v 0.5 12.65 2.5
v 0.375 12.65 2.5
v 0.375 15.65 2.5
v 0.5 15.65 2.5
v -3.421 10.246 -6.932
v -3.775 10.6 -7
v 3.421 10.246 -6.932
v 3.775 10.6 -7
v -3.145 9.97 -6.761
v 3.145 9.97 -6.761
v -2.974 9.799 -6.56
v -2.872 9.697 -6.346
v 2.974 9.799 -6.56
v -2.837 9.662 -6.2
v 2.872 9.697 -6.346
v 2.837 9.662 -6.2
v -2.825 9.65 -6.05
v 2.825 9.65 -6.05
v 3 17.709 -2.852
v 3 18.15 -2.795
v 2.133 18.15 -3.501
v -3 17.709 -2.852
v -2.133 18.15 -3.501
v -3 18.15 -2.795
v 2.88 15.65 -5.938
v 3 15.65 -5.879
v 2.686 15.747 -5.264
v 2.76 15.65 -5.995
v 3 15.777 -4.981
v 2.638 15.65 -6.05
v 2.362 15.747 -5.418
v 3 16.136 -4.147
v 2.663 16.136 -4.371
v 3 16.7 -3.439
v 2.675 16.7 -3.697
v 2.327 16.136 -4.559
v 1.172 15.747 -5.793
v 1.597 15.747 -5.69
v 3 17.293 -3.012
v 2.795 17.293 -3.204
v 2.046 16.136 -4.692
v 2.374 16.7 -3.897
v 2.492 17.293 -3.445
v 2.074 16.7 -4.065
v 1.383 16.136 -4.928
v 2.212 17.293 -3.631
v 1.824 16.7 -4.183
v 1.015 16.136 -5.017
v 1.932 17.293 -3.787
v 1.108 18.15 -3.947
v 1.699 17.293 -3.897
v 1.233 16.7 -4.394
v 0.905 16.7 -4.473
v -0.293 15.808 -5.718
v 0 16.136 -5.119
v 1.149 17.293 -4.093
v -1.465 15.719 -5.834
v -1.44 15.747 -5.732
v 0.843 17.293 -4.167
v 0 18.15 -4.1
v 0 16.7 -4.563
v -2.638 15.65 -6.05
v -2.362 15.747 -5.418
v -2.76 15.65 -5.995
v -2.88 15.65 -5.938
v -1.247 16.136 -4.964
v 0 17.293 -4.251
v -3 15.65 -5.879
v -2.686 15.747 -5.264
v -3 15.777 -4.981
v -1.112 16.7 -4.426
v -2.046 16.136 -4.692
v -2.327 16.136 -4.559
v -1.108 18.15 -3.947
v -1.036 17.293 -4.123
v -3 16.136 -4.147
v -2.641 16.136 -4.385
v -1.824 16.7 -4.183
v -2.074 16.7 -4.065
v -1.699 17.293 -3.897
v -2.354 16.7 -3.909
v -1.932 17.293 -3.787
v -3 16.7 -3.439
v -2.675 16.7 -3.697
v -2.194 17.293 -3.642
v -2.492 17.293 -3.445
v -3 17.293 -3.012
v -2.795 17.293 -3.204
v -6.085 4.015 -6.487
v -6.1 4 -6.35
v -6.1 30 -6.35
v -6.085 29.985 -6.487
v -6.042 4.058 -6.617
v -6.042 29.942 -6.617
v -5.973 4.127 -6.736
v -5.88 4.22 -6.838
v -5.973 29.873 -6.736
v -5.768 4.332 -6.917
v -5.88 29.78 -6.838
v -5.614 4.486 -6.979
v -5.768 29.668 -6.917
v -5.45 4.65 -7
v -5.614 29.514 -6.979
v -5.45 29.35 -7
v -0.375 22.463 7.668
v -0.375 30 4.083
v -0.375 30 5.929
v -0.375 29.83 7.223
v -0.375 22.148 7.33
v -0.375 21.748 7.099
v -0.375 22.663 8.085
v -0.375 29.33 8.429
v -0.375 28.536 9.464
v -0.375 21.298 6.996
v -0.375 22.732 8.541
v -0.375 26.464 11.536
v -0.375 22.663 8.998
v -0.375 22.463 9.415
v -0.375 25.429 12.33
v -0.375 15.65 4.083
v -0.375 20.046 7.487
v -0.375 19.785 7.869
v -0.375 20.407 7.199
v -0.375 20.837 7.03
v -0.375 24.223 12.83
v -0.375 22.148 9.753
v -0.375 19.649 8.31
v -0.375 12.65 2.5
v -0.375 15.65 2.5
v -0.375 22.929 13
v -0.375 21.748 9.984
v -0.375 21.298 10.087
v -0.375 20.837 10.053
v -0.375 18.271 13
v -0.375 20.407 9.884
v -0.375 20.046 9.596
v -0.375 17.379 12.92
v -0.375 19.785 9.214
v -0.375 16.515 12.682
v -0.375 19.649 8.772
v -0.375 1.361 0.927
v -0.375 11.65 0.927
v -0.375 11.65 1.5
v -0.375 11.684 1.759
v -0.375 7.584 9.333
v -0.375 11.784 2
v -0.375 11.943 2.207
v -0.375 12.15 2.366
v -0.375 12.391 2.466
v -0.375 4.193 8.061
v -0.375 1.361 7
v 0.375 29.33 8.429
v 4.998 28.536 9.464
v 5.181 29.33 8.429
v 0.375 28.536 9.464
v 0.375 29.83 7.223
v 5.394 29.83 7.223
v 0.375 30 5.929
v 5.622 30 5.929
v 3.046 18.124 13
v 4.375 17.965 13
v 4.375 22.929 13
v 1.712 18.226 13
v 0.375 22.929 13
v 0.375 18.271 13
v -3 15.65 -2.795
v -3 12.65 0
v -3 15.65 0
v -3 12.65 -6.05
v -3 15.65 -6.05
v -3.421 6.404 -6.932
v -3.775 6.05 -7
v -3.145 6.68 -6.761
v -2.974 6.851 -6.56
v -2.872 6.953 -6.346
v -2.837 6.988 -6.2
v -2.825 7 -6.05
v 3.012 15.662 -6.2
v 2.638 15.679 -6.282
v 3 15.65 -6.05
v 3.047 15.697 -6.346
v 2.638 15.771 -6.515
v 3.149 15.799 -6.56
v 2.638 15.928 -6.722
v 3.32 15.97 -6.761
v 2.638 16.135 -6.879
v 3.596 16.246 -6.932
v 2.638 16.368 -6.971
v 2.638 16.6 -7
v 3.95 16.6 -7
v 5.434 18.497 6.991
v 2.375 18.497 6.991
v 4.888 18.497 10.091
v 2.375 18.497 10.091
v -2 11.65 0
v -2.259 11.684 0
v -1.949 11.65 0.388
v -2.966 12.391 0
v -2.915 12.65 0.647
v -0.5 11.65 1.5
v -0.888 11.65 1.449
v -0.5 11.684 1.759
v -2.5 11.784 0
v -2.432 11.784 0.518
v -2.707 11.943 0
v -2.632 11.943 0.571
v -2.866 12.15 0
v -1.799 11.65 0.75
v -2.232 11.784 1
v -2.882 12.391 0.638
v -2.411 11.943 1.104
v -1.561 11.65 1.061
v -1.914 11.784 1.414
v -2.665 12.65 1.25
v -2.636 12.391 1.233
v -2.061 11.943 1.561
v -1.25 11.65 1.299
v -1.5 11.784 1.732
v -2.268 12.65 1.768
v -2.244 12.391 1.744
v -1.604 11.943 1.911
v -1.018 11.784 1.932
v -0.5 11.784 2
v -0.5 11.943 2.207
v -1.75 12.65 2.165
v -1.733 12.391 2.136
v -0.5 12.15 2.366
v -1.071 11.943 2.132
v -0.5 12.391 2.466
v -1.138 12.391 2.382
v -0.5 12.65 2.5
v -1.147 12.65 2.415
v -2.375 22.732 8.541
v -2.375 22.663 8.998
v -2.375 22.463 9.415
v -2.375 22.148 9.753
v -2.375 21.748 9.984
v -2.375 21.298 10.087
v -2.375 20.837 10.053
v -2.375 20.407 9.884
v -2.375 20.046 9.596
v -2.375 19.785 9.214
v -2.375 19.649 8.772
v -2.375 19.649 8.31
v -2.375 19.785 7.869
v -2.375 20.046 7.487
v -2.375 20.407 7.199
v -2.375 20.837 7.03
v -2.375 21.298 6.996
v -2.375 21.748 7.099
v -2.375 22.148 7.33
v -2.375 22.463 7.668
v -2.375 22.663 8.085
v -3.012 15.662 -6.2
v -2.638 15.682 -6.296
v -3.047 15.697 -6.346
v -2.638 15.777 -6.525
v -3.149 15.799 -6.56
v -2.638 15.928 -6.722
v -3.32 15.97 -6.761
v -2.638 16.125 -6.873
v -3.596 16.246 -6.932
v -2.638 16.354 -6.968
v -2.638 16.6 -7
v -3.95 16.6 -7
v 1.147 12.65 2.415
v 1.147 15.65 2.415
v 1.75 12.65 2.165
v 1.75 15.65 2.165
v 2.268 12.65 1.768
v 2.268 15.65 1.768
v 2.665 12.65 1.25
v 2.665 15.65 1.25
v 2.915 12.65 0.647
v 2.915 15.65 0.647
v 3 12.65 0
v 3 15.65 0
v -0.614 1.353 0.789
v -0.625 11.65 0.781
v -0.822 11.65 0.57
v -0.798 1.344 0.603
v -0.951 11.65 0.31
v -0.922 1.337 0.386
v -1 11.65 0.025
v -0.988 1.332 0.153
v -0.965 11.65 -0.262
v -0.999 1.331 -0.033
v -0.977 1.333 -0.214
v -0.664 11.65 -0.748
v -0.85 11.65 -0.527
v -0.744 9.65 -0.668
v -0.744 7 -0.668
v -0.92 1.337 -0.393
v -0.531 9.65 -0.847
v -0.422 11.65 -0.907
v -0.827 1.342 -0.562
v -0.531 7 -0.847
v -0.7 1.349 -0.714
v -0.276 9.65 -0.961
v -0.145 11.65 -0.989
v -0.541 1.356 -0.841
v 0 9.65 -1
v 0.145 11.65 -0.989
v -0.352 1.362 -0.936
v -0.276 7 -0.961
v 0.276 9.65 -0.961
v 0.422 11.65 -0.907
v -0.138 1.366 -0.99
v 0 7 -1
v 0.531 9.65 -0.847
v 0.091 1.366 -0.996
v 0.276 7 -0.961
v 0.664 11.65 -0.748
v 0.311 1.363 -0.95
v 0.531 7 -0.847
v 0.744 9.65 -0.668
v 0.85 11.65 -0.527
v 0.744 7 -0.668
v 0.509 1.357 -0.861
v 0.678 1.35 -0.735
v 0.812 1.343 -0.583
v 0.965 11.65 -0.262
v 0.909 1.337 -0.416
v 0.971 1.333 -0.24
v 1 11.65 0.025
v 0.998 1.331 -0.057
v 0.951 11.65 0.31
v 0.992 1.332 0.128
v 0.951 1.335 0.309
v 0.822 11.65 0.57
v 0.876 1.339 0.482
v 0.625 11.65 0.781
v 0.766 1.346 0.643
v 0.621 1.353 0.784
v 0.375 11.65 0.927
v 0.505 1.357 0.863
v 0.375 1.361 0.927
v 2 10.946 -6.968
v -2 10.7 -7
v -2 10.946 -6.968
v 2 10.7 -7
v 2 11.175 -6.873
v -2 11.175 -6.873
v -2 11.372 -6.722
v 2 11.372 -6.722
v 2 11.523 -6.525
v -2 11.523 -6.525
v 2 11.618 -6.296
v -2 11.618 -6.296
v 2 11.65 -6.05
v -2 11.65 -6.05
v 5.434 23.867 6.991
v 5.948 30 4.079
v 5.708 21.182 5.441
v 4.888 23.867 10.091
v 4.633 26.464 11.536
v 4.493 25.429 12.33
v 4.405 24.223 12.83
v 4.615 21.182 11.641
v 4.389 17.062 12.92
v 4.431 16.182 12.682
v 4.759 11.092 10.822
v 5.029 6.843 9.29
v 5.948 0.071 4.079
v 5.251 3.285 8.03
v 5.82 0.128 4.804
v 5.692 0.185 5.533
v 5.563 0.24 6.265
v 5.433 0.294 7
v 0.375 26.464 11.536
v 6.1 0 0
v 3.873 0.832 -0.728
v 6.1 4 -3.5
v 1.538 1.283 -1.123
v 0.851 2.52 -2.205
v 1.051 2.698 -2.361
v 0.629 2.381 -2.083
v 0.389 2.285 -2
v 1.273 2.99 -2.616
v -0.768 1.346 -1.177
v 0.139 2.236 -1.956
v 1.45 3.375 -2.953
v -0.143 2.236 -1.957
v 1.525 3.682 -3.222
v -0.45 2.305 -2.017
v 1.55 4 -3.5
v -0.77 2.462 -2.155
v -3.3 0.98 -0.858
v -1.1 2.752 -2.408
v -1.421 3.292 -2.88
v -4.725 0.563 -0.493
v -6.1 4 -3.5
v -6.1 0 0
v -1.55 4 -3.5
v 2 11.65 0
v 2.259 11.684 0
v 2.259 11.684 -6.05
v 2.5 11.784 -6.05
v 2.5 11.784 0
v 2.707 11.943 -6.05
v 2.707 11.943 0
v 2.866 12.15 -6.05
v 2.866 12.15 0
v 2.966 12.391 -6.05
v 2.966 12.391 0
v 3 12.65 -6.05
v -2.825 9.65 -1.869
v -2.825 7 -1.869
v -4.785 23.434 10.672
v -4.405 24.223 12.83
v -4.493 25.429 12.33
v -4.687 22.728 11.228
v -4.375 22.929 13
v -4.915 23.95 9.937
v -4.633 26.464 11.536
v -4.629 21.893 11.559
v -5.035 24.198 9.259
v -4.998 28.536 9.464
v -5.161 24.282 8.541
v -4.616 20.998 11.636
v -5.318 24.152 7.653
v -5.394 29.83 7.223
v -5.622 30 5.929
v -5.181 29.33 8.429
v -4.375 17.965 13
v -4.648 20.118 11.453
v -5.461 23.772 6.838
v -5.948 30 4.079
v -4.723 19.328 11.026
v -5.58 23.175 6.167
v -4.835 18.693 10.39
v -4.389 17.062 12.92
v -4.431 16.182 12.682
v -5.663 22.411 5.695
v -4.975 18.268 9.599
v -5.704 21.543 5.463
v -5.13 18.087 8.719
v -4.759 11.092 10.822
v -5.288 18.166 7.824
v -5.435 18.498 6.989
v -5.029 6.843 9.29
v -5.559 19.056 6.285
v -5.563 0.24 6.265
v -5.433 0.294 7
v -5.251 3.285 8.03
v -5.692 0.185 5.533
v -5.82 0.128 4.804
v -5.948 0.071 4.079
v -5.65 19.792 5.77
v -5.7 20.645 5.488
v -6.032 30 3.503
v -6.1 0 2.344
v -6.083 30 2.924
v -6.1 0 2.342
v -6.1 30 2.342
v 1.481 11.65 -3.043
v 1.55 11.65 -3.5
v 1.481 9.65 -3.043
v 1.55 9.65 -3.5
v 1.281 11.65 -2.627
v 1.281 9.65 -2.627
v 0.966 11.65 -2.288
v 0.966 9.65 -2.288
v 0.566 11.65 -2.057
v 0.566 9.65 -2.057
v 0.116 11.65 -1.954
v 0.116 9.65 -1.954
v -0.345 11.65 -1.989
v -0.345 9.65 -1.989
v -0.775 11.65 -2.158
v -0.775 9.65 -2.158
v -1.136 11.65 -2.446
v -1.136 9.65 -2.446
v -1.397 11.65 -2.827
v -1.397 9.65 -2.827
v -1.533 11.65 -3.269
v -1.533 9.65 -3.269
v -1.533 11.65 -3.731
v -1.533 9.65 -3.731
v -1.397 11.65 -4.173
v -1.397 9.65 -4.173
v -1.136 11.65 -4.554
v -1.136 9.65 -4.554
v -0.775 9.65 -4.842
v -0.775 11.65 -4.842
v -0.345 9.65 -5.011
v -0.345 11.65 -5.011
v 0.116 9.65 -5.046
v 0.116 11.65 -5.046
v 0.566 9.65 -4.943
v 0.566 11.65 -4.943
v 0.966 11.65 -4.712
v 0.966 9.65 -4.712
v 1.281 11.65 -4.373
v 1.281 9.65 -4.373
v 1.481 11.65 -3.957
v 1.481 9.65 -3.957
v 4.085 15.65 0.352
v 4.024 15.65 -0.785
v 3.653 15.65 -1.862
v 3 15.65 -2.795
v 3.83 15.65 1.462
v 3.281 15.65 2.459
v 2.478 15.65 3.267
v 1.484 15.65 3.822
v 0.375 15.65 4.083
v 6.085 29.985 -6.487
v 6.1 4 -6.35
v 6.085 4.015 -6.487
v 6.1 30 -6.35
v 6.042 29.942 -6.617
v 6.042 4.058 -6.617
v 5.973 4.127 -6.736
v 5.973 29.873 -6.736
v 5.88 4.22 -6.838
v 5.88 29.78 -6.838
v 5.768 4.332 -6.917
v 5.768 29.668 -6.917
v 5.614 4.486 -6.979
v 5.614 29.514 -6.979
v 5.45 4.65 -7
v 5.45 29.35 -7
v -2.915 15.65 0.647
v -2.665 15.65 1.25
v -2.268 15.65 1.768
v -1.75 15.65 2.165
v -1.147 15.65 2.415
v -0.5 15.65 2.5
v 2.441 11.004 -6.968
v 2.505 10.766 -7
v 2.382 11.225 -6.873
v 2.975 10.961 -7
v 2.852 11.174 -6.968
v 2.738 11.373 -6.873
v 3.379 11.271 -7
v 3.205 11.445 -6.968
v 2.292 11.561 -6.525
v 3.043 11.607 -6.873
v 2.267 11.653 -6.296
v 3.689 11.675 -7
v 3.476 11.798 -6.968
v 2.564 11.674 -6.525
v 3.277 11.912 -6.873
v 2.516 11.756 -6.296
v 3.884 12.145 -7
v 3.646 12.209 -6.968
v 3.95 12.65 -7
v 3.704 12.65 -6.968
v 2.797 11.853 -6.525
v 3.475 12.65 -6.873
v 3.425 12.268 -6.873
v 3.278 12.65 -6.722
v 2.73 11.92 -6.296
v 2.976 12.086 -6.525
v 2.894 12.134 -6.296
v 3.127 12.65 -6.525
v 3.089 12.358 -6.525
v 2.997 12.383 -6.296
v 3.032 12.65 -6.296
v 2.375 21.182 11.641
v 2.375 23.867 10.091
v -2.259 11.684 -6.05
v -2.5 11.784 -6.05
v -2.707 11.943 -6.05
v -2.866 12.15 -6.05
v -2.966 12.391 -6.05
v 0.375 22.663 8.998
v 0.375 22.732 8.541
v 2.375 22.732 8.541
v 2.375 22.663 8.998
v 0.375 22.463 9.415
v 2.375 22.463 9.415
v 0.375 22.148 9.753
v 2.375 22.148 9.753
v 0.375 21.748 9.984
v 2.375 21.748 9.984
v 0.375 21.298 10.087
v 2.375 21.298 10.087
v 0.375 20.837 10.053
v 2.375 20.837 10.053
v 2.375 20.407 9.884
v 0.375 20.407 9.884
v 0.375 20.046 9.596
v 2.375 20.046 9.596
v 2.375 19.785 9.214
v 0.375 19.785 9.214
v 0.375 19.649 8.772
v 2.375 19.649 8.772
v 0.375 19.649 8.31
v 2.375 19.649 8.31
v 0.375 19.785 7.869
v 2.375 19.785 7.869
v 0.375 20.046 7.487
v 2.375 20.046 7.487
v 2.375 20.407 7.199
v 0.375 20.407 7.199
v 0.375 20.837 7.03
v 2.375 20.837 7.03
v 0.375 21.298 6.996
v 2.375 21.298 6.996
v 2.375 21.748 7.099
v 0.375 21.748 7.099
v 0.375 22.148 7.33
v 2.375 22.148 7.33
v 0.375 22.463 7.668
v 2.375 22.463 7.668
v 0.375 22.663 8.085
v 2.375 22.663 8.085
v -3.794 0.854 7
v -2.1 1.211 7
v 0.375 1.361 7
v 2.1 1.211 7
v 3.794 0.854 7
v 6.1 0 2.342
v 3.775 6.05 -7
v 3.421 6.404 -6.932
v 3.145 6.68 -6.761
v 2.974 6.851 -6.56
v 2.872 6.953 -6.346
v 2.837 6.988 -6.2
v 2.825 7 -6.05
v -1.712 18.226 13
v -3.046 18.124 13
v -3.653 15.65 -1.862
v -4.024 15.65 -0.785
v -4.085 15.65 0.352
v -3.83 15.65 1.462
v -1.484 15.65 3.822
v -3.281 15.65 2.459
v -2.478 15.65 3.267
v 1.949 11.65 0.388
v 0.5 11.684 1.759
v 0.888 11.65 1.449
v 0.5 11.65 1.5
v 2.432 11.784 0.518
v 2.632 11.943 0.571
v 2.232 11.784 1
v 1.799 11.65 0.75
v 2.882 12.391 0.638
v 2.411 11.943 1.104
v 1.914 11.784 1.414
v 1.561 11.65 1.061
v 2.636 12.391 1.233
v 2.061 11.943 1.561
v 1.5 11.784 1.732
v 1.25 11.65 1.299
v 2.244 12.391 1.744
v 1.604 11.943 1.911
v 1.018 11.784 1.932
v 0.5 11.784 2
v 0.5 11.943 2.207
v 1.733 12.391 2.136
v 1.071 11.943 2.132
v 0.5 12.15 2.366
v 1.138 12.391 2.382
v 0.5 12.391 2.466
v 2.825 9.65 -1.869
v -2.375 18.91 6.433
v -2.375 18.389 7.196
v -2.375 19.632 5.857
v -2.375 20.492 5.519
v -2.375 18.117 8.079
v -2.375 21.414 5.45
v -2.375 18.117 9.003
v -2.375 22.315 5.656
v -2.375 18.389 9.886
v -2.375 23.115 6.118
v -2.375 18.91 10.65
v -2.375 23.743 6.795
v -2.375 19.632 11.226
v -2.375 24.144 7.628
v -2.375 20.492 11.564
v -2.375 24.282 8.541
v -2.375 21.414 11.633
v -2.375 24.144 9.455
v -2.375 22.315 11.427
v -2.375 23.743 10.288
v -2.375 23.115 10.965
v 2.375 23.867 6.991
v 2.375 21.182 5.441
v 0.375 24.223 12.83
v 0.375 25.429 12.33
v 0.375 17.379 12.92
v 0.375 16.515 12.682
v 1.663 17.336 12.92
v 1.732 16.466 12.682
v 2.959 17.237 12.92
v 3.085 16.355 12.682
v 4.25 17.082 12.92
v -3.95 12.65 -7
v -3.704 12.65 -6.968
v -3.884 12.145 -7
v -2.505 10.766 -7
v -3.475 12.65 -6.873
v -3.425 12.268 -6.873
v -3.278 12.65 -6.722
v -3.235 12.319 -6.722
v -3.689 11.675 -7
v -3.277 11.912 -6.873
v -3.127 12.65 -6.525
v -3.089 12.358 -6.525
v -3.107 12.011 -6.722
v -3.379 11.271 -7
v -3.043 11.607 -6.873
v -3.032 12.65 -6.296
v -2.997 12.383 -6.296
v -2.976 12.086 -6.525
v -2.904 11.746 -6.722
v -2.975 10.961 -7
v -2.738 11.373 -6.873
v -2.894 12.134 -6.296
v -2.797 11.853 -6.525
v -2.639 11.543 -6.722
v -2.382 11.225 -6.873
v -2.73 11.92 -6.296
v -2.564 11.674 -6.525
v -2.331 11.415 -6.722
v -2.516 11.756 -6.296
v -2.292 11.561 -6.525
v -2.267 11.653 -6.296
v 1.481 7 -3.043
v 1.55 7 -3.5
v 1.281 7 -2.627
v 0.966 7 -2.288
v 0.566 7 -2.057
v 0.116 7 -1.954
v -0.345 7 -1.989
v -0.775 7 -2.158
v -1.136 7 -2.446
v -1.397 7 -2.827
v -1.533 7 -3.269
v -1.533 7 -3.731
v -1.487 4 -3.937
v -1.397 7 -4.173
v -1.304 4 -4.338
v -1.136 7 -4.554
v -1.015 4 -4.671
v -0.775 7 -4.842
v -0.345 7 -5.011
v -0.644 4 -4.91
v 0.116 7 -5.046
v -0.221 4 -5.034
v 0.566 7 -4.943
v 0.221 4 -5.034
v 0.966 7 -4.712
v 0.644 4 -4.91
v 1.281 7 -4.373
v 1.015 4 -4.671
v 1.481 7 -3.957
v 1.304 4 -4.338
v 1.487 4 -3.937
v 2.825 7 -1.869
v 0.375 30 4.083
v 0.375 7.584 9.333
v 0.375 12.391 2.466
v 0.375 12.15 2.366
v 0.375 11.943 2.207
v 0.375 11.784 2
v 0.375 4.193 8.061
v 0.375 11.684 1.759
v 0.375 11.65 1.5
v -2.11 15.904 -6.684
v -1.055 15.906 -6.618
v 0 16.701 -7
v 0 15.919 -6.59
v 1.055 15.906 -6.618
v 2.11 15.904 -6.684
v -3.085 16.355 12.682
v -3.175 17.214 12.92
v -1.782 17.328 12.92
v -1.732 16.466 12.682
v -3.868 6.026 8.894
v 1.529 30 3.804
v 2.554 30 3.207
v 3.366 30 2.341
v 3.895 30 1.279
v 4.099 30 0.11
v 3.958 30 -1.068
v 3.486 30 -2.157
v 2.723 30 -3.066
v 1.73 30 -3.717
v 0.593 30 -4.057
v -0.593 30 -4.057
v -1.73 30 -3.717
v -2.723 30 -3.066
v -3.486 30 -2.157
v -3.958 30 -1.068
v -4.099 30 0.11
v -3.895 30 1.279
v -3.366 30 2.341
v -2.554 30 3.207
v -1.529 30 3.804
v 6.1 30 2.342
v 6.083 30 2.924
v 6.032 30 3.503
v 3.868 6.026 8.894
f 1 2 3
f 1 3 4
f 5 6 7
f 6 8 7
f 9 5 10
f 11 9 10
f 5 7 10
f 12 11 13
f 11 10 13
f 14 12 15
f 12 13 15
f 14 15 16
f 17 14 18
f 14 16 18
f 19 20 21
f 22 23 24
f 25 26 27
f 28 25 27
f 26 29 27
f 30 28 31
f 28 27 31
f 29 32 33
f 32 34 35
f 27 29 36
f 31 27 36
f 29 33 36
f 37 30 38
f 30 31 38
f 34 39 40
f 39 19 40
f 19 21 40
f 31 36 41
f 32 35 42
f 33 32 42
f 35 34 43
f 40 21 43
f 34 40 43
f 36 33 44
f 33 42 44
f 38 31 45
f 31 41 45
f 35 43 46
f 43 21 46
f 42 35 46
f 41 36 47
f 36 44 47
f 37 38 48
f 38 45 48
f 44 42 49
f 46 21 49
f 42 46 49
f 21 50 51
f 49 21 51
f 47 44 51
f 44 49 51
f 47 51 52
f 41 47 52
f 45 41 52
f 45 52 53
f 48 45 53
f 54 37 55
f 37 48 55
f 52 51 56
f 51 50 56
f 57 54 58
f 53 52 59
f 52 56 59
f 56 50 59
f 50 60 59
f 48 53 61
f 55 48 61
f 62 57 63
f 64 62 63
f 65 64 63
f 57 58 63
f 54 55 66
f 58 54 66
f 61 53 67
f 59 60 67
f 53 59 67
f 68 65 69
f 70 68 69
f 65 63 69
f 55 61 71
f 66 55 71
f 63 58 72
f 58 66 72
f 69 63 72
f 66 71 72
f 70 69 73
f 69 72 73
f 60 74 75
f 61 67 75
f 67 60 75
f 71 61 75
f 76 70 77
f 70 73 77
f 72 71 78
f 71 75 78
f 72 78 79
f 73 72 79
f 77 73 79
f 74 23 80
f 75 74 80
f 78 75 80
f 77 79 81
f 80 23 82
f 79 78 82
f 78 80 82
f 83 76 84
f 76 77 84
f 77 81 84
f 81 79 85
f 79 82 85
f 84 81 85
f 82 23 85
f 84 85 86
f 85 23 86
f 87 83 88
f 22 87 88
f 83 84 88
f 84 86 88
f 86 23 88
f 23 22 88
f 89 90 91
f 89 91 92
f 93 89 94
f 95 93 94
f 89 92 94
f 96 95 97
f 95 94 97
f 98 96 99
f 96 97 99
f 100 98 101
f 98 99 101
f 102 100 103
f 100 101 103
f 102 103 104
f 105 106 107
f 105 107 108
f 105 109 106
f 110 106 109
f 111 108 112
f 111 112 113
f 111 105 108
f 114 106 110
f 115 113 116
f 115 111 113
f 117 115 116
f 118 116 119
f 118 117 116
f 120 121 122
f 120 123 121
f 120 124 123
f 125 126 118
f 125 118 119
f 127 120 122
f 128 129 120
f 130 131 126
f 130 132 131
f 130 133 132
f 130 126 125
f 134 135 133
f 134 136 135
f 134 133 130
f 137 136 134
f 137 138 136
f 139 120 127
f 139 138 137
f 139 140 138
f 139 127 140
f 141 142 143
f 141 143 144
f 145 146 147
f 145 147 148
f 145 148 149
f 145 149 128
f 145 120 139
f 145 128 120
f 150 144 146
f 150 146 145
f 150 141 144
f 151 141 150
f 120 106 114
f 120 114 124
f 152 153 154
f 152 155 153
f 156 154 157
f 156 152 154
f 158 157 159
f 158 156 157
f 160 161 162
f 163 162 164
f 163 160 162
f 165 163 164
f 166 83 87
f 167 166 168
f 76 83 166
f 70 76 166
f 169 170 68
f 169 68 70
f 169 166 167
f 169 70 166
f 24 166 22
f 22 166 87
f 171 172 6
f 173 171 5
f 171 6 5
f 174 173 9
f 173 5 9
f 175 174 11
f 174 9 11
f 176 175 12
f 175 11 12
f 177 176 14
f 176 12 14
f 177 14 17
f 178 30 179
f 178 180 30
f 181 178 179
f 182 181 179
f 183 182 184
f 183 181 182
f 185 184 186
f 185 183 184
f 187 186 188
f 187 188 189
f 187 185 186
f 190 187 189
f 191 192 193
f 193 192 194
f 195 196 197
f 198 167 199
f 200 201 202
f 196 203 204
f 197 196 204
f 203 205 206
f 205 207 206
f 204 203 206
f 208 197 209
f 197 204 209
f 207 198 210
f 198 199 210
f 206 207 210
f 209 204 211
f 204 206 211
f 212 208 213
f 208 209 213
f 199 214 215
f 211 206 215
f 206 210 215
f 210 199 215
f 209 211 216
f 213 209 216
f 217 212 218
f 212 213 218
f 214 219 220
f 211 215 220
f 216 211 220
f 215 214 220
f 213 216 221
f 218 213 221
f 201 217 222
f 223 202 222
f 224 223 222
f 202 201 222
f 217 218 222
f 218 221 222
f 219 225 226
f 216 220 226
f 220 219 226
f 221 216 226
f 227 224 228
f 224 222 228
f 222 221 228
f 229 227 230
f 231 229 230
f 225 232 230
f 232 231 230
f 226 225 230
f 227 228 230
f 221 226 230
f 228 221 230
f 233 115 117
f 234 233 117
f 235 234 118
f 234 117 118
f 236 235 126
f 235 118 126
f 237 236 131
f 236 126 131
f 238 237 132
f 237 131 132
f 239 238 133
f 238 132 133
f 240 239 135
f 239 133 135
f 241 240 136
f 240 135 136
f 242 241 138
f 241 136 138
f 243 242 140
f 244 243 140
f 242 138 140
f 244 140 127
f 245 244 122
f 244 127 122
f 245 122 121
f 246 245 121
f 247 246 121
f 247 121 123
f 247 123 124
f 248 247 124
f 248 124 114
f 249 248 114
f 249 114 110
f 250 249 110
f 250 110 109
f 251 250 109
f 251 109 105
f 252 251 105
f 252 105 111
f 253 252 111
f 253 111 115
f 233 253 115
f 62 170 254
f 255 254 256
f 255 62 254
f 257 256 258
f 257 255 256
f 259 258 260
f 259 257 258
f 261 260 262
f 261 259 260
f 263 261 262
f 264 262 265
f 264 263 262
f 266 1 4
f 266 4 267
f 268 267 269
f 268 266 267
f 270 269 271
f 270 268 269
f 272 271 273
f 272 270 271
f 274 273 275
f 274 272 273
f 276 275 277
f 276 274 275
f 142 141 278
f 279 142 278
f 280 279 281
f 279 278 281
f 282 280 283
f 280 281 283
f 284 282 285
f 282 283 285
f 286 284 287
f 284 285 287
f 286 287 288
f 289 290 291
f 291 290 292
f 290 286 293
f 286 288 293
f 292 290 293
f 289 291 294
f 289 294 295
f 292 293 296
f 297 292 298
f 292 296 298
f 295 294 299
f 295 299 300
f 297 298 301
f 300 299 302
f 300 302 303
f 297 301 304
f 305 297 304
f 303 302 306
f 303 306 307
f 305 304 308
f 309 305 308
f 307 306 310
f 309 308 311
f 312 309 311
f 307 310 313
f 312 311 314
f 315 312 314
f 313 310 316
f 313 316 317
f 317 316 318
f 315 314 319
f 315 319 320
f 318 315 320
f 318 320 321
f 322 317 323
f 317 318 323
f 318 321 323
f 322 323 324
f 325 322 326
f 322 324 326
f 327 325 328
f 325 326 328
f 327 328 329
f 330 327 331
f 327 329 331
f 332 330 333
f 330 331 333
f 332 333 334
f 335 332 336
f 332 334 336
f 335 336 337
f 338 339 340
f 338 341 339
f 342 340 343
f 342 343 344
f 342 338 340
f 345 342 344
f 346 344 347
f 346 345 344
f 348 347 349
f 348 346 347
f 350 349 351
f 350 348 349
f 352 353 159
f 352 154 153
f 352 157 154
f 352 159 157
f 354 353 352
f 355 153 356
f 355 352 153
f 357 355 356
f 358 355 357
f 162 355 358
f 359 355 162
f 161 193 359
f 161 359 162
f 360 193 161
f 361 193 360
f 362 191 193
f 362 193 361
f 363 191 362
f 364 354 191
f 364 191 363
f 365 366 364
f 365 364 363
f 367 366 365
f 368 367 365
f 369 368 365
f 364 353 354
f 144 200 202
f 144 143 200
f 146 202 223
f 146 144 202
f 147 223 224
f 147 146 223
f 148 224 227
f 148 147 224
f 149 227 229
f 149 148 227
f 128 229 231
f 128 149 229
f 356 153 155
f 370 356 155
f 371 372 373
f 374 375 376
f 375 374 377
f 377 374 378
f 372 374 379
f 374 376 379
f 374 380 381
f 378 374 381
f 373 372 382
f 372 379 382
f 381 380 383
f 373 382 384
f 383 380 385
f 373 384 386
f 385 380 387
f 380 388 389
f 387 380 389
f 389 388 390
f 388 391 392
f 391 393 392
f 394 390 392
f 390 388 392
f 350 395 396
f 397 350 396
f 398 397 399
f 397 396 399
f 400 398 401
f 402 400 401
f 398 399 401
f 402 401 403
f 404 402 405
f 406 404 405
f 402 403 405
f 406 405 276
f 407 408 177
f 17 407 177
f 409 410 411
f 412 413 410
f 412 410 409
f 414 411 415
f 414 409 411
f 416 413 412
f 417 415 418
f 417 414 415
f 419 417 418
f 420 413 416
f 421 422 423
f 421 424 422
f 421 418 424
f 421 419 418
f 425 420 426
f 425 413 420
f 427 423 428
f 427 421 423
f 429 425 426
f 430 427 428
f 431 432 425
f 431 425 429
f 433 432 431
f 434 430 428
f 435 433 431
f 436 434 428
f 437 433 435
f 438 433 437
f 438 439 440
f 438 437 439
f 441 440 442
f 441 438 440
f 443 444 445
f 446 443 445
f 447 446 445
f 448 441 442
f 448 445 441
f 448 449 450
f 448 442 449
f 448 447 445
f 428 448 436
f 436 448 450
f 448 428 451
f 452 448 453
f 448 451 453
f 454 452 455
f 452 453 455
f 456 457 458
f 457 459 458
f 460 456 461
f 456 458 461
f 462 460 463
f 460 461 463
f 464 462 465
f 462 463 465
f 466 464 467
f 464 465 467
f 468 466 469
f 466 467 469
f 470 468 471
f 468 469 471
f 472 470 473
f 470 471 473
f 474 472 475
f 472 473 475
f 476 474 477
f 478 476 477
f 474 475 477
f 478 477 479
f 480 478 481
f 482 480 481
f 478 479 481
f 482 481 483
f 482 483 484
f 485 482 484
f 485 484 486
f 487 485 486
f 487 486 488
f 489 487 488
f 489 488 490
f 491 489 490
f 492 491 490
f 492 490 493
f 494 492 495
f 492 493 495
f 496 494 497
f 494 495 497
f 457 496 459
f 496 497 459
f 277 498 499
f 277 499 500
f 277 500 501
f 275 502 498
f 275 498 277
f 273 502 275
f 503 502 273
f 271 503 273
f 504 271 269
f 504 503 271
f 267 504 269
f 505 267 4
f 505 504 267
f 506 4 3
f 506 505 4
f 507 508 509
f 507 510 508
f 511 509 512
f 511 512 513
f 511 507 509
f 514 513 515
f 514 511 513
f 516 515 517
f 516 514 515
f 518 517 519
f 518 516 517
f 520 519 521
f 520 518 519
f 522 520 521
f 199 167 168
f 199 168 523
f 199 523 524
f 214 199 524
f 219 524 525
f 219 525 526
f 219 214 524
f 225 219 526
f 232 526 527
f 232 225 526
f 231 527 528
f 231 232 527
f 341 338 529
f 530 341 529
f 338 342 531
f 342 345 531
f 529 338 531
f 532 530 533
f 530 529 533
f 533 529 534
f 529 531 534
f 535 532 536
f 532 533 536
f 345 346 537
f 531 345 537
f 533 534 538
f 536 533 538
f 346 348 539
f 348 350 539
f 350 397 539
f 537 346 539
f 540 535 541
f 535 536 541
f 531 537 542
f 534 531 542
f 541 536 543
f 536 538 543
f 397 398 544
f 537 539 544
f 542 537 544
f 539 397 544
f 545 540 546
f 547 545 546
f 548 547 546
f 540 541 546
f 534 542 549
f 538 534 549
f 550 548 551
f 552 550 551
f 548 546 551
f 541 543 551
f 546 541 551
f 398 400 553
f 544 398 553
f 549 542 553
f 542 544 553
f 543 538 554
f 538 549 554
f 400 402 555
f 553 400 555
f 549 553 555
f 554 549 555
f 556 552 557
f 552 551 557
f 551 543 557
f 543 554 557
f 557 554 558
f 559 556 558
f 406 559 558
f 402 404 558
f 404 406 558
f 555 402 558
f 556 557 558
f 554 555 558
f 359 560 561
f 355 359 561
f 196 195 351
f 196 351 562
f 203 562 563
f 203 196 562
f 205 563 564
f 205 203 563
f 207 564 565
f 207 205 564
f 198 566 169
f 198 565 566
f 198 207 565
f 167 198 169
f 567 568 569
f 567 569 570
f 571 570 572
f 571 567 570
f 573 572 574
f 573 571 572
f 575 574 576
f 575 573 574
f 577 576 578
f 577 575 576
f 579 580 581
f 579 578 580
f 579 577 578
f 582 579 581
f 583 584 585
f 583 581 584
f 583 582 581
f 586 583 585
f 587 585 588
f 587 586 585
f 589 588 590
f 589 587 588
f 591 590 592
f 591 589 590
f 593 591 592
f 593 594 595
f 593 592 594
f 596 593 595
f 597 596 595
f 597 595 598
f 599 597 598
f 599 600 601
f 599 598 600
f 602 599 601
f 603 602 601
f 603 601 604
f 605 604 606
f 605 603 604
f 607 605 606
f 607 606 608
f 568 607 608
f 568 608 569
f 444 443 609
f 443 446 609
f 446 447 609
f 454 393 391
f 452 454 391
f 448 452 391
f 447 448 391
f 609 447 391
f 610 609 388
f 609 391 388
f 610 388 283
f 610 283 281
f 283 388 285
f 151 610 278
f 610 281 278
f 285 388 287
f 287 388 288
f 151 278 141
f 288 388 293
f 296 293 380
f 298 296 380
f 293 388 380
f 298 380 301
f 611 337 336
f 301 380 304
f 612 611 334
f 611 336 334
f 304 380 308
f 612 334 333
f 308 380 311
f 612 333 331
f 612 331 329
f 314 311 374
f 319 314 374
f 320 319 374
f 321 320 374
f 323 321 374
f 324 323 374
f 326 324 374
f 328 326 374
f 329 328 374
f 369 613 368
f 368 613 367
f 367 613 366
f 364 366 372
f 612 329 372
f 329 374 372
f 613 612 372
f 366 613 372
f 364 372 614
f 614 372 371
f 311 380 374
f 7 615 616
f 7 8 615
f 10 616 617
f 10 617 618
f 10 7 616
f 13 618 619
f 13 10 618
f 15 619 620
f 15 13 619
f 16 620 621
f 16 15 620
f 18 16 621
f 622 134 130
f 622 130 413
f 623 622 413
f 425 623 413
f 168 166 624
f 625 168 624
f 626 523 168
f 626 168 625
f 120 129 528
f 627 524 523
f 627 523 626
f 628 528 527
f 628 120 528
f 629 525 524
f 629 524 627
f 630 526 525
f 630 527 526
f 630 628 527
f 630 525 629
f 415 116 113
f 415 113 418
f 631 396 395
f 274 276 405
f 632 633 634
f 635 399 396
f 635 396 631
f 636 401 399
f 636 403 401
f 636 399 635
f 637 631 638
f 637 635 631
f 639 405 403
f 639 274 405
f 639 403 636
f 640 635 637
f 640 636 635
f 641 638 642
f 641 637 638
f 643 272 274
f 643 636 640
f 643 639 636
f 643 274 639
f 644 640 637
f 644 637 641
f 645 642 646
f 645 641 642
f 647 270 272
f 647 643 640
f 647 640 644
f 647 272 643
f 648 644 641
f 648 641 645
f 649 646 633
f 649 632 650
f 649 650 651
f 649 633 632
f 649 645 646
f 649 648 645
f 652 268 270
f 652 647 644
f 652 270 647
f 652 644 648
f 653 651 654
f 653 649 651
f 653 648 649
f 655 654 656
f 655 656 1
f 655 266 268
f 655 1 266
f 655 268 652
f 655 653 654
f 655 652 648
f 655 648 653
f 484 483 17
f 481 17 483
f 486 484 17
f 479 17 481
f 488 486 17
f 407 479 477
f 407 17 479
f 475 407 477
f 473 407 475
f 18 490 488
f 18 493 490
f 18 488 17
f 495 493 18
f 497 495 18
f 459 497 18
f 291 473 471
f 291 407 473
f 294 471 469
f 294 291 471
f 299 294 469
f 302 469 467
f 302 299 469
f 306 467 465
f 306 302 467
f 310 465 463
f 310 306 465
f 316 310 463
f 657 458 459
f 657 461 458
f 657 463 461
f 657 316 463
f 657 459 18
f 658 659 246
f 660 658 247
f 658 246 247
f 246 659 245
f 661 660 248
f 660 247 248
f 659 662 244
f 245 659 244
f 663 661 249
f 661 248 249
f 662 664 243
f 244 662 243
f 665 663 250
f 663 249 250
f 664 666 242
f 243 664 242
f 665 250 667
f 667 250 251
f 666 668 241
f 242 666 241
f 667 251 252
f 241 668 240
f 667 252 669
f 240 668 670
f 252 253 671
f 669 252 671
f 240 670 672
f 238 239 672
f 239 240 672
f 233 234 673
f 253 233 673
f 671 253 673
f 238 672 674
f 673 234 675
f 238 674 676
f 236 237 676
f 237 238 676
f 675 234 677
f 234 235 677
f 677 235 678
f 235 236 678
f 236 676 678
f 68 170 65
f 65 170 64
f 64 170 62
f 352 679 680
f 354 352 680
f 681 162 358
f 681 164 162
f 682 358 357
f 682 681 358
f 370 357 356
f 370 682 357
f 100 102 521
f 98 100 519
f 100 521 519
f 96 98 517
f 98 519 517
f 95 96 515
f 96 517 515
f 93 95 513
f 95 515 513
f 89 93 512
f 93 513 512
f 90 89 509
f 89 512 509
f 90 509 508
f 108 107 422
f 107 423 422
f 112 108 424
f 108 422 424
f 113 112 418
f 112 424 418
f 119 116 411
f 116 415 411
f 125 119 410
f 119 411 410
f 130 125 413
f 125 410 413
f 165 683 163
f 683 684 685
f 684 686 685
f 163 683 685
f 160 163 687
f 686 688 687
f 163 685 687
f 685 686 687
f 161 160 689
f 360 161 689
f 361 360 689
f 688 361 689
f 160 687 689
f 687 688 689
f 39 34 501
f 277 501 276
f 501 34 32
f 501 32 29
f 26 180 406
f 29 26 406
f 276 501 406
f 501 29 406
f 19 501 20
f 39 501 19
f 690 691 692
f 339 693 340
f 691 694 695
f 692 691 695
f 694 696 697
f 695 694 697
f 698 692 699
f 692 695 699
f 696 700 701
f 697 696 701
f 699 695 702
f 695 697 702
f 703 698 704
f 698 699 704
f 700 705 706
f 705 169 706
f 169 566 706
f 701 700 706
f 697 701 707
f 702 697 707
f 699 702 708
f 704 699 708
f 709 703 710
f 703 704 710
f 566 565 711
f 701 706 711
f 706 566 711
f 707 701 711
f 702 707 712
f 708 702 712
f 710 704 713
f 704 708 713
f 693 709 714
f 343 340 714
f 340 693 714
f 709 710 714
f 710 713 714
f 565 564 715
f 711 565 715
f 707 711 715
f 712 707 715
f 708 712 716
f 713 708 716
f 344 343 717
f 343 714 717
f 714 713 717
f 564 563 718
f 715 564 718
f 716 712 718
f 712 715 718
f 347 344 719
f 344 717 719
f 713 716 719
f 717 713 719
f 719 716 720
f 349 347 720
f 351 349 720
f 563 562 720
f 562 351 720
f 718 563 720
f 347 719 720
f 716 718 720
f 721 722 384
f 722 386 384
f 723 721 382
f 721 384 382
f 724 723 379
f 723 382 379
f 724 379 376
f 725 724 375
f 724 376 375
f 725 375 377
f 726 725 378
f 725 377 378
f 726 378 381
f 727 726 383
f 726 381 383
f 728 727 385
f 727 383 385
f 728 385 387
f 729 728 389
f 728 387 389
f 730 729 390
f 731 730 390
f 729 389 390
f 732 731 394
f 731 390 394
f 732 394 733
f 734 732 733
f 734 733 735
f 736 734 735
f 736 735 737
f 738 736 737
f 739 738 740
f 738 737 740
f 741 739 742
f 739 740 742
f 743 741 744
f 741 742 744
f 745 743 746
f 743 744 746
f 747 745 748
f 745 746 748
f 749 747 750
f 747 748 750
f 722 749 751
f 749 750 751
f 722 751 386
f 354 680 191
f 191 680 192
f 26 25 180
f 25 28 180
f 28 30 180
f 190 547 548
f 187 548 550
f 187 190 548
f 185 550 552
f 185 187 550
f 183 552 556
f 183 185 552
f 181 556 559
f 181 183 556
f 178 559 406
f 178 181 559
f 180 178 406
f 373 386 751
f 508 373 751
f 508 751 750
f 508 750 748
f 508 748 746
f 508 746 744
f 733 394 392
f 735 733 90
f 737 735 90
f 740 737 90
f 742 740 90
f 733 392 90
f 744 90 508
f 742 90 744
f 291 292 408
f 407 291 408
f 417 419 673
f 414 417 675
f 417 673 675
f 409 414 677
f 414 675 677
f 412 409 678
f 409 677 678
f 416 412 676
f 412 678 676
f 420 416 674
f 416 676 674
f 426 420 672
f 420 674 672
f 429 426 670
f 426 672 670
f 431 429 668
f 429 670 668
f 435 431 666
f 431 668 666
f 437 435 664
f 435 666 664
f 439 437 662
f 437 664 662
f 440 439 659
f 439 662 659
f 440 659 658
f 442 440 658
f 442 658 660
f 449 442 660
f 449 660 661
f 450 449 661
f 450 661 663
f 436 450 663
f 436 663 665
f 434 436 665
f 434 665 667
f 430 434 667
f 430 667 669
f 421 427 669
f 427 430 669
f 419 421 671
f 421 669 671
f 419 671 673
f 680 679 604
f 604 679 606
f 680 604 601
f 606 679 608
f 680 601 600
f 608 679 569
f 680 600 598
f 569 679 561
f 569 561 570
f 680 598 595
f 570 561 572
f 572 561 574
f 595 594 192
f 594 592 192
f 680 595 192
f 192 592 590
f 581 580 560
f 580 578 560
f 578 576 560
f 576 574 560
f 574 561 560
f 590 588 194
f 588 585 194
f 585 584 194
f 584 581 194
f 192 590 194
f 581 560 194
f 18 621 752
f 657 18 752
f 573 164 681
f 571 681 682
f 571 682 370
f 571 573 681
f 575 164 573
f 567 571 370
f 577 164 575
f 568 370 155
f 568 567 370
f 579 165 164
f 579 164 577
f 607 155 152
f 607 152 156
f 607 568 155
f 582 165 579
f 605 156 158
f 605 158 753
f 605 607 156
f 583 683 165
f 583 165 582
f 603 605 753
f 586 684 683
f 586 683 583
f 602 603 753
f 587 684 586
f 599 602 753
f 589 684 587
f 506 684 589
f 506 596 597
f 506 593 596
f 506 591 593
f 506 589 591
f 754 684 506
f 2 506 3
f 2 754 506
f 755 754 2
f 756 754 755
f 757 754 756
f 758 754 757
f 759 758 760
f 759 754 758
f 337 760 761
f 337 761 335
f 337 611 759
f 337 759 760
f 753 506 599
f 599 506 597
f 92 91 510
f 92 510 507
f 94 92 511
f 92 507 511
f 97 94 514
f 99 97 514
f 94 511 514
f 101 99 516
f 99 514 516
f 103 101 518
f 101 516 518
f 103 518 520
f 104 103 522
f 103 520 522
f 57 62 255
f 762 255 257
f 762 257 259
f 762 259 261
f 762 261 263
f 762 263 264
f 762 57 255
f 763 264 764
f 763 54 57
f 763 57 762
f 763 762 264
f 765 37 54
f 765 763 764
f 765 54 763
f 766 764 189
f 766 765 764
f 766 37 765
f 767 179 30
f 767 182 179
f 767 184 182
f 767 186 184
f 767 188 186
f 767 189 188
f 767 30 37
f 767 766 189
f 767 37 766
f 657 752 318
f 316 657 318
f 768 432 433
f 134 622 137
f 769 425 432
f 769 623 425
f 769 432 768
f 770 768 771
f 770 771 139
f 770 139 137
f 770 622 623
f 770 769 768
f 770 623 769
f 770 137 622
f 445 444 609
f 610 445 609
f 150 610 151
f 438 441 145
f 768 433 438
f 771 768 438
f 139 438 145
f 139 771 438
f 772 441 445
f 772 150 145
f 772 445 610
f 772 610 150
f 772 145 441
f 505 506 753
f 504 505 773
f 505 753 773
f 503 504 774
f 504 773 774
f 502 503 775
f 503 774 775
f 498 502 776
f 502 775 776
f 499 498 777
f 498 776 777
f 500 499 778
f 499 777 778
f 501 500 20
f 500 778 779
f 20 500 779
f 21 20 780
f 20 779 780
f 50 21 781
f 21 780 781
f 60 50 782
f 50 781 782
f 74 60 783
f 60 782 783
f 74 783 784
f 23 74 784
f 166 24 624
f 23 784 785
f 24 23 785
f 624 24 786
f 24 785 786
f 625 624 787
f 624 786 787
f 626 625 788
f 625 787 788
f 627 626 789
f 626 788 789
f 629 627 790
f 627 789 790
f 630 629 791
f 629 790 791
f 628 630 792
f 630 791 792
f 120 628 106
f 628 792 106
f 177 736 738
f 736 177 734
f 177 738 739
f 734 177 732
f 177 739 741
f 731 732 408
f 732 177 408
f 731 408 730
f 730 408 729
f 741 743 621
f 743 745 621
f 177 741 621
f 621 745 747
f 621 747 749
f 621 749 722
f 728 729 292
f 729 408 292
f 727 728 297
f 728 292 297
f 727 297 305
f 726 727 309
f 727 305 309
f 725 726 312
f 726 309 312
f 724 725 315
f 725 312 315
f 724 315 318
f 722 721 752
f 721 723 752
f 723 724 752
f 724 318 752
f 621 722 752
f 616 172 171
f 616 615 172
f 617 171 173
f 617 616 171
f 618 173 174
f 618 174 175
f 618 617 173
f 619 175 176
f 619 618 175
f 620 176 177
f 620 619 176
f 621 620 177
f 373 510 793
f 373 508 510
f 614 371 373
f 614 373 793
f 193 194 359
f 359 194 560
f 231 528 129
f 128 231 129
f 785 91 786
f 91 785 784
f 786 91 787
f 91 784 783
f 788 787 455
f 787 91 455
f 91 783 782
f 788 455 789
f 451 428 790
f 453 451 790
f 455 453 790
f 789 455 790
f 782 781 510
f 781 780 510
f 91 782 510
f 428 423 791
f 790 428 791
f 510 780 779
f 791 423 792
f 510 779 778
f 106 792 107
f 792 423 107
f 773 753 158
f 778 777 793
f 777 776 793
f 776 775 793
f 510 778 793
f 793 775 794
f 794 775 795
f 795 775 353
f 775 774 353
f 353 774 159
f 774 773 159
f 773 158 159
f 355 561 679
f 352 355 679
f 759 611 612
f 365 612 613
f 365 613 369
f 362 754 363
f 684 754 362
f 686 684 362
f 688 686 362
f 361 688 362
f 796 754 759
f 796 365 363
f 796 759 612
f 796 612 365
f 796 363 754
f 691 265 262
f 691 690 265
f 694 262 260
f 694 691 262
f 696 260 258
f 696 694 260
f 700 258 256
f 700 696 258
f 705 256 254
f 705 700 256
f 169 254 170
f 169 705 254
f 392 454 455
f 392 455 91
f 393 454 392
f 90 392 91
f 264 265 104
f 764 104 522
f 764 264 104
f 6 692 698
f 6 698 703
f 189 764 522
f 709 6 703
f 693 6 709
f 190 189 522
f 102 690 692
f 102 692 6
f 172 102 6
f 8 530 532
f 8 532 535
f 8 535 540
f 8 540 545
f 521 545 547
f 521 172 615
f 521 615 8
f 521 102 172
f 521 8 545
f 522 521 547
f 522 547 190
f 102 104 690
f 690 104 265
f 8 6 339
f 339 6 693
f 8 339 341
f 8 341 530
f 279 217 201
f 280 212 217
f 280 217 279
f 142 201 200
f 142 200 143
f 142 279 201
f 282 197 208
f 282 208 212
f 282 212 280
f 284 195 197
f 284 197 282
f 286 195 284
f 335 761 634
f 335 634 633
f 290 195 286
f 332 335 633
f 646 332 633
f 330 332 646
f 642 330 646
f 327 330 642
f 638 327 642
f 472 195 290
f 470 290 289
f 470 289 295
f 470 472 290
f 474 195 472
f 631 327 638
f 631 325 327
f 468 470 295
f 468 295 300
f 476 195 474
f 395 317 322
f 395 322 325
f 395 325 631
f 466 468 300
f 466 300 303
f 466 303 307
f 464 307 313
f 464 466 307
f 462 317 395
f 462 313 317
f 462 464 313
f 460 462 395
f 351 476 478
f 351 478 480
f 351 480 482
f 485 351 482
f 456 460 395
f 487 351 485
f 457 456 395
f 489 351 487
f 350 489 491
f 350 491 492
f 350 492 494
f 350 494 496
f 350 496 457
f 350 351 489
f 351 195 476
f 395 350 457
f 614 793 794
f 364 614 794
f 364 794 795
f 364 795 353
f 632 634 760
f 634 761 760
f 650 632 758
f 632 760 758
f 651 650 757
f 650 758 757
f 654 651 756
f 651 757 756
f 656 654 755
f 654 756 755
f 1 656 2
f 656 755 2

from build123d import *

# Parameters (mm, degrees)
EXTRUDE004_DEPTH                     = 10
SKETCH008_R                          = 3.1
EXTRUDE003_DEPTH                     = 10
EXTRUDE002_DEPTH                     = 2.65
EXTRUDE002_ONTO_SKETCH004_ROLL_ANGLE = 90
EXTRUDE001_DEPTH                     = 14
EXTRUDE_DEPTH                        = 30
EXTRUDE_ONTO_SKETCH_ROLL_ANGLE       = 90
FILLET_R                             = 10
POCKET_DEPTH                         = 20.001
SKETCH003_R                          = 1.55
POCKET001_DEPTH                      = 8
SKETCH005_W                          = 6
SKETCH005_H                          = 4
POCKET002_DEPTH                      = 9.5
SKETCH006_R                          = 4.1
POCKET003_DEPTH                      = 14.35
FILLET001_R                          = 2.5
FILLET002_R                          = 1
FILLET003_R                          = 2.5
FILLET004_R                          = 0.95
CHAMFER_SIZE2                        = 16
CHAMFER_SIZE                         = 6
CHAMFER001_SIZE                      = 5
SKETCH007_R                          = 1.55
POCKET004_DEPTH                      = 5.726
POCKET004_DEPTH_BACK                 = 6.476
FILLET005_R                          = 5
FILLET006_R                          = 0.65


with BuildPart() as extrude004:
    # Sketch009 → Extrude004 (new body)
    with BuildSketch(Plane(origin=(0.375, 0, 0), x_dir=(0, -1, 0), z_dir=(-1, 0, 0))):
        Polygon((-21.182001, 11.641407), (-23.86668, 10.091407), (-23.86668, 6.991407), (-21.182001, 5.441407), (-18.497322, 6.991407), (-18.497322, 10.091407), align=None)
    extrude(amount=-EXTRUDE004_DEPTH)


with BuildPart() as extrude004_1:
    # Extrude004 placement: moved
    add(extrude004.part.moved(Location((2, 0, 0))))


with BuildPart() as extrude003:
    # Sketch008 → Extrude003 (new body)
    with BuildSketch(Plane.YZ.offset(-0.375)):
        with Locations((21.182001, 8.541407)):
            Circle(SKETCH008_R)
    extrude(amount=-EXTRUDE003_DEPTH)


with BuildPart() as extrude003_1:
    # Extrude003 placement: moved
    add(extrude003.part.moved(Location((-2, 0, 0))))


with BuildPart() as extrude002:
    # Sketch004 as drawn → Extrude002 (new)
    with BuildSketch(Plane.XY):
        Polygon((0, -0.237971), (-2.825, -1.868985), (-2.825, -7), (2.825, -7), (2.825, -1.868985), align=None)
    extrude(amount=-EXTRUDE002_DEPTH)


with BuildPart() as extrude002_1:
    # Extrude002 onto Sketch004 roll: moved
    add(extrude002.part.rotate(Axis((0, 0, 0), (1, 0, 0)), EXTRUDE002_ONTO_SKETCH004_ROLL_ANGLE))


with BuildPart() as extrude002_2:
    # Extrude002 onto Sketch004 placement: moved
    add(extrude002_1.part.moved(Location((0, 4, 0))))


with BuildPart() as extrude002_3:
    # Extrude002 placement: moved
    add(extrude002_2.part.moved(Location((0, 3, 0))))


with BuildPart() as extrude001:
    # Sketch001 → Extrude001 (new body)
    with BuildSketch(Plane.YZ):
        Polygon((0, -7), (0, 0), (4, -3.5), (4, -7), align=None)
    extrude(amount=EXTRUDE001_DEPTH)


with BuildPart() as extrude001_1:
    # Extrude001 placement: moved
    add(extrude001.part.moved(Location((-7, 0, 0))))


with BuildPart() as fillet006:
    # Sketch as drawn → Extrude (new)
    with BuildSketch(Plane.XY):
        with BuildLine():
            Line((-6.1, -7), (6.1, -7))
            Line((6.1, -7), (6.1, 3.217039))
            Line((6.1, 3.217039), (4.375, 13))
            Line((4.375, 13), (0.375, 13))
            Line((0.375, 13), (0.375, 0.927025))
            ThreePointArc((-0.375, 0.927025), (0, -1), (0.375, 0.927025))
            Line((-0.375, 0.927025), (-0.375, 13))
            Line((-0.375, 13), (-4.375, 13))
            Line((-4.375, 13), (-6.1, 3.217039))
            Line((-6.1, 3.217039), (-6.1, -7))
        make_face()
    extrude(amount=-EXTRUDE_DEPTH)


with BuildPart() as fillet006_1:
    # Extrude onto Sketch roll: moved
    add(fillet006.part.rotate(Axis((0, 0, 0), (1, 0, 0)), EXTRUDE_ONTO_SKETCH_ROLL_ANGLE))


with BuildPart() as fillet006_2:
    # Extrude onto Sketch placement: moved
    add(fillet006_1.part)

    # Fillet
    fillet_edges = [fillet006_2.edges().sort_by_distance(p)[0] for p in [
        (-6.1, 15, 3.217039),
        (6.1, 15, 3.217039),
    ]]
    fillet(fillet_edges, radius=FILLET_R)

    # Sketch002 → Pocket (cut, through all)
    with BuildSketch(Plane(origin=(0, 0, -7), x_dir=(1, 0, 0), z_dir=(0, 0, -1))):
        with BuildLine():
            Line((-6.1, 0), (6.1, 0))
            ThreePointArc((-6.1, 0), (0, -1.366323), (6.1, 0))
        make_face()
    extrude(amount=-POCKET_DEPTH, mode=Mode.SUBTRACT)

    # Cut: cut Extrude001
    add(extrude001_1.part, mode=Mode.SUBTRACT)

    # Sketch003 → Pocket001 (cut, symmetric)
    with BuildSketch(Plane.XZ.offset(-4)):
        with Locations((0, -3.5)):
            Circle(SKETCH003_R)
    extrude(amount=POCKET001_DEPTH, both=True, mode=Mode.SUBTRACT)

    # Cut001: cut Extrude002
    add(extrude002_3.part, mode=Mode.SUBTRACT)

    # Sketch005 → Pocket002 (cut)
    with BuildSketch(Plane(origin=(0, 0, -7), x_dir=(1, 0, 0), z_dir=(0, 0, -1))):
        with Locations((0, -13.65)):
            Rectangle(SKETCH005_W, SKETCH005_H)
    extrude(amount=-POCKET002_DEPTH, mode=Mode.SUBTRACT)

    # Sketch006 → Pocket003 (cut)
    with BuildSketch(Plane(origin=(0, 30, 0), x_dir=(-1, 0, 0), z_dir=(0, 1, 0))):
        Circle(SKETCH006_R)
    extrude(amount=-POCKET003_DEPTH, mode=Mode.SUBTRACT)

    # Fillet001
    fillet001_edges = [fillet006_2.edges().sort_by_distance(p)[0] for p in [
        (-3, 13.65, 2.5),
        (3, 13.65, 2.5),
    ]]
    fillet(fillet001_edges, radius=FILLET001_R)

    # Fillet002
    fillet002_edges = [fillet006_2.edges().sort_by_distance(p)[0] for p in [
        (-3, 11.65, -3.5),
        (-2.267767, 11.65, 1.767767),
        (-0.4375, 11.65, 2.5),
        (3, 11.65, -3.5),
        (2.267767, 11.65, 1.767767),
        (0.4375, 11.65, 2.5),
    ]]
    fillet(fillet002_edges, radius=FILLET002_R)

    # Fillet003
    fillet003_edges = [fillet006_2.edges().sort_by_distance(p)[0] for p in [
        (0, 15.65, -4.1),
    ]]
    fillet(fillet003_edges, radius=FILLET003_R)

    # Fillet004
    fillet004_edges = [fillet006_2.edges().sort_by_distance(p)[0] for p in [
        (-3, 14.15, -7),
        (0, 15.65, -7),
        (-2.707107, 11.942893, -7),
        (0, 11.65, -7),
        (3, 14.15, -7),
        (2.707107, 11.942893, -7),
        (-2.825, 8.325, -7),
        (0, 7, -7),
        (0, 9.65, -7),
        (2.825, 8.325, -7),
    ]]
    fillet(fillet004_edges, radius=FILLET004_R)

    # Chamfer
    chamfer_edges = [fillet006_2.edges().sort_by_distance(p)[0] for p in [
        (2.399268, 1.16361, 13),
        (-2.399268, 1.16361, 13),
    ]]
    chamfer_side = fillet006_2.faces().sort_by_distance((0, 1.366323, -1.007857))[0]
    chamfer(chamfer_edges, length=CHAMFER_SIZE, length2=CHAMFER_SIZE2, reference=chamfer_side)

    # Chamfer001
    chamfer001_edges = [fillet006_2.edges().sort_by_distance(p)[0] for p in [
        (2.375, 30, 13),
        (-2.375, 30, 13),
    ]]
    chamfer(chamfer001_edges, length=CHAMFER001_SIZE)

    # Sketch007 → Pocket004 (cut, two sides)
    with BuildSketch(Plane.YZ.offset(-0.375)) as pocket004_sk:
        with Locations((21.182001, 8.541407)):
            Circle(SKETCH007_R)
    extrude(amount=-POCKET004_DEPTH, mode=Mode.SUBTRACT)
    extrude(pocket004_sk.sketch, amount=POCKET004_DEPTH_BACK, mode=Mode.SUBTRACT)

    # Fillet005
    fillet005_edges = [fillet006_2.edges().sort_by_distance(p)[0] for p in [
        (2.375, 25, 13),
        (2.380223, 17.272689, 13),
        (2.815817, 30, 8),
        (-2.815817, 30, 8),
        (-2.375, 25, 13),
        (-2.380223, 17.272689, 13),
    ]]
    fillet(fillet005_edges, radius=FILLET005_R)

    # Cut002: cut Extrude003
    add(extrude003_1.part, mode=Mode.SUBTRACT)

    # Cut003: cut Extrude004
    add(extrude004_1.part, mode=Mode.SUBTRACT)

    # Fillet006
    fillet006_edges = [fillet006_2.edges().sort_by_distance(p)[0] for p in [
        (0, 30, -7),
        (6.1, 17, -7),
        (-6.1, 17, -7),
        (0, 4, -7),
    ]]
    fillet(fillet006_edges, radius=FILLET006_R)


solid = fillet006_2.part
